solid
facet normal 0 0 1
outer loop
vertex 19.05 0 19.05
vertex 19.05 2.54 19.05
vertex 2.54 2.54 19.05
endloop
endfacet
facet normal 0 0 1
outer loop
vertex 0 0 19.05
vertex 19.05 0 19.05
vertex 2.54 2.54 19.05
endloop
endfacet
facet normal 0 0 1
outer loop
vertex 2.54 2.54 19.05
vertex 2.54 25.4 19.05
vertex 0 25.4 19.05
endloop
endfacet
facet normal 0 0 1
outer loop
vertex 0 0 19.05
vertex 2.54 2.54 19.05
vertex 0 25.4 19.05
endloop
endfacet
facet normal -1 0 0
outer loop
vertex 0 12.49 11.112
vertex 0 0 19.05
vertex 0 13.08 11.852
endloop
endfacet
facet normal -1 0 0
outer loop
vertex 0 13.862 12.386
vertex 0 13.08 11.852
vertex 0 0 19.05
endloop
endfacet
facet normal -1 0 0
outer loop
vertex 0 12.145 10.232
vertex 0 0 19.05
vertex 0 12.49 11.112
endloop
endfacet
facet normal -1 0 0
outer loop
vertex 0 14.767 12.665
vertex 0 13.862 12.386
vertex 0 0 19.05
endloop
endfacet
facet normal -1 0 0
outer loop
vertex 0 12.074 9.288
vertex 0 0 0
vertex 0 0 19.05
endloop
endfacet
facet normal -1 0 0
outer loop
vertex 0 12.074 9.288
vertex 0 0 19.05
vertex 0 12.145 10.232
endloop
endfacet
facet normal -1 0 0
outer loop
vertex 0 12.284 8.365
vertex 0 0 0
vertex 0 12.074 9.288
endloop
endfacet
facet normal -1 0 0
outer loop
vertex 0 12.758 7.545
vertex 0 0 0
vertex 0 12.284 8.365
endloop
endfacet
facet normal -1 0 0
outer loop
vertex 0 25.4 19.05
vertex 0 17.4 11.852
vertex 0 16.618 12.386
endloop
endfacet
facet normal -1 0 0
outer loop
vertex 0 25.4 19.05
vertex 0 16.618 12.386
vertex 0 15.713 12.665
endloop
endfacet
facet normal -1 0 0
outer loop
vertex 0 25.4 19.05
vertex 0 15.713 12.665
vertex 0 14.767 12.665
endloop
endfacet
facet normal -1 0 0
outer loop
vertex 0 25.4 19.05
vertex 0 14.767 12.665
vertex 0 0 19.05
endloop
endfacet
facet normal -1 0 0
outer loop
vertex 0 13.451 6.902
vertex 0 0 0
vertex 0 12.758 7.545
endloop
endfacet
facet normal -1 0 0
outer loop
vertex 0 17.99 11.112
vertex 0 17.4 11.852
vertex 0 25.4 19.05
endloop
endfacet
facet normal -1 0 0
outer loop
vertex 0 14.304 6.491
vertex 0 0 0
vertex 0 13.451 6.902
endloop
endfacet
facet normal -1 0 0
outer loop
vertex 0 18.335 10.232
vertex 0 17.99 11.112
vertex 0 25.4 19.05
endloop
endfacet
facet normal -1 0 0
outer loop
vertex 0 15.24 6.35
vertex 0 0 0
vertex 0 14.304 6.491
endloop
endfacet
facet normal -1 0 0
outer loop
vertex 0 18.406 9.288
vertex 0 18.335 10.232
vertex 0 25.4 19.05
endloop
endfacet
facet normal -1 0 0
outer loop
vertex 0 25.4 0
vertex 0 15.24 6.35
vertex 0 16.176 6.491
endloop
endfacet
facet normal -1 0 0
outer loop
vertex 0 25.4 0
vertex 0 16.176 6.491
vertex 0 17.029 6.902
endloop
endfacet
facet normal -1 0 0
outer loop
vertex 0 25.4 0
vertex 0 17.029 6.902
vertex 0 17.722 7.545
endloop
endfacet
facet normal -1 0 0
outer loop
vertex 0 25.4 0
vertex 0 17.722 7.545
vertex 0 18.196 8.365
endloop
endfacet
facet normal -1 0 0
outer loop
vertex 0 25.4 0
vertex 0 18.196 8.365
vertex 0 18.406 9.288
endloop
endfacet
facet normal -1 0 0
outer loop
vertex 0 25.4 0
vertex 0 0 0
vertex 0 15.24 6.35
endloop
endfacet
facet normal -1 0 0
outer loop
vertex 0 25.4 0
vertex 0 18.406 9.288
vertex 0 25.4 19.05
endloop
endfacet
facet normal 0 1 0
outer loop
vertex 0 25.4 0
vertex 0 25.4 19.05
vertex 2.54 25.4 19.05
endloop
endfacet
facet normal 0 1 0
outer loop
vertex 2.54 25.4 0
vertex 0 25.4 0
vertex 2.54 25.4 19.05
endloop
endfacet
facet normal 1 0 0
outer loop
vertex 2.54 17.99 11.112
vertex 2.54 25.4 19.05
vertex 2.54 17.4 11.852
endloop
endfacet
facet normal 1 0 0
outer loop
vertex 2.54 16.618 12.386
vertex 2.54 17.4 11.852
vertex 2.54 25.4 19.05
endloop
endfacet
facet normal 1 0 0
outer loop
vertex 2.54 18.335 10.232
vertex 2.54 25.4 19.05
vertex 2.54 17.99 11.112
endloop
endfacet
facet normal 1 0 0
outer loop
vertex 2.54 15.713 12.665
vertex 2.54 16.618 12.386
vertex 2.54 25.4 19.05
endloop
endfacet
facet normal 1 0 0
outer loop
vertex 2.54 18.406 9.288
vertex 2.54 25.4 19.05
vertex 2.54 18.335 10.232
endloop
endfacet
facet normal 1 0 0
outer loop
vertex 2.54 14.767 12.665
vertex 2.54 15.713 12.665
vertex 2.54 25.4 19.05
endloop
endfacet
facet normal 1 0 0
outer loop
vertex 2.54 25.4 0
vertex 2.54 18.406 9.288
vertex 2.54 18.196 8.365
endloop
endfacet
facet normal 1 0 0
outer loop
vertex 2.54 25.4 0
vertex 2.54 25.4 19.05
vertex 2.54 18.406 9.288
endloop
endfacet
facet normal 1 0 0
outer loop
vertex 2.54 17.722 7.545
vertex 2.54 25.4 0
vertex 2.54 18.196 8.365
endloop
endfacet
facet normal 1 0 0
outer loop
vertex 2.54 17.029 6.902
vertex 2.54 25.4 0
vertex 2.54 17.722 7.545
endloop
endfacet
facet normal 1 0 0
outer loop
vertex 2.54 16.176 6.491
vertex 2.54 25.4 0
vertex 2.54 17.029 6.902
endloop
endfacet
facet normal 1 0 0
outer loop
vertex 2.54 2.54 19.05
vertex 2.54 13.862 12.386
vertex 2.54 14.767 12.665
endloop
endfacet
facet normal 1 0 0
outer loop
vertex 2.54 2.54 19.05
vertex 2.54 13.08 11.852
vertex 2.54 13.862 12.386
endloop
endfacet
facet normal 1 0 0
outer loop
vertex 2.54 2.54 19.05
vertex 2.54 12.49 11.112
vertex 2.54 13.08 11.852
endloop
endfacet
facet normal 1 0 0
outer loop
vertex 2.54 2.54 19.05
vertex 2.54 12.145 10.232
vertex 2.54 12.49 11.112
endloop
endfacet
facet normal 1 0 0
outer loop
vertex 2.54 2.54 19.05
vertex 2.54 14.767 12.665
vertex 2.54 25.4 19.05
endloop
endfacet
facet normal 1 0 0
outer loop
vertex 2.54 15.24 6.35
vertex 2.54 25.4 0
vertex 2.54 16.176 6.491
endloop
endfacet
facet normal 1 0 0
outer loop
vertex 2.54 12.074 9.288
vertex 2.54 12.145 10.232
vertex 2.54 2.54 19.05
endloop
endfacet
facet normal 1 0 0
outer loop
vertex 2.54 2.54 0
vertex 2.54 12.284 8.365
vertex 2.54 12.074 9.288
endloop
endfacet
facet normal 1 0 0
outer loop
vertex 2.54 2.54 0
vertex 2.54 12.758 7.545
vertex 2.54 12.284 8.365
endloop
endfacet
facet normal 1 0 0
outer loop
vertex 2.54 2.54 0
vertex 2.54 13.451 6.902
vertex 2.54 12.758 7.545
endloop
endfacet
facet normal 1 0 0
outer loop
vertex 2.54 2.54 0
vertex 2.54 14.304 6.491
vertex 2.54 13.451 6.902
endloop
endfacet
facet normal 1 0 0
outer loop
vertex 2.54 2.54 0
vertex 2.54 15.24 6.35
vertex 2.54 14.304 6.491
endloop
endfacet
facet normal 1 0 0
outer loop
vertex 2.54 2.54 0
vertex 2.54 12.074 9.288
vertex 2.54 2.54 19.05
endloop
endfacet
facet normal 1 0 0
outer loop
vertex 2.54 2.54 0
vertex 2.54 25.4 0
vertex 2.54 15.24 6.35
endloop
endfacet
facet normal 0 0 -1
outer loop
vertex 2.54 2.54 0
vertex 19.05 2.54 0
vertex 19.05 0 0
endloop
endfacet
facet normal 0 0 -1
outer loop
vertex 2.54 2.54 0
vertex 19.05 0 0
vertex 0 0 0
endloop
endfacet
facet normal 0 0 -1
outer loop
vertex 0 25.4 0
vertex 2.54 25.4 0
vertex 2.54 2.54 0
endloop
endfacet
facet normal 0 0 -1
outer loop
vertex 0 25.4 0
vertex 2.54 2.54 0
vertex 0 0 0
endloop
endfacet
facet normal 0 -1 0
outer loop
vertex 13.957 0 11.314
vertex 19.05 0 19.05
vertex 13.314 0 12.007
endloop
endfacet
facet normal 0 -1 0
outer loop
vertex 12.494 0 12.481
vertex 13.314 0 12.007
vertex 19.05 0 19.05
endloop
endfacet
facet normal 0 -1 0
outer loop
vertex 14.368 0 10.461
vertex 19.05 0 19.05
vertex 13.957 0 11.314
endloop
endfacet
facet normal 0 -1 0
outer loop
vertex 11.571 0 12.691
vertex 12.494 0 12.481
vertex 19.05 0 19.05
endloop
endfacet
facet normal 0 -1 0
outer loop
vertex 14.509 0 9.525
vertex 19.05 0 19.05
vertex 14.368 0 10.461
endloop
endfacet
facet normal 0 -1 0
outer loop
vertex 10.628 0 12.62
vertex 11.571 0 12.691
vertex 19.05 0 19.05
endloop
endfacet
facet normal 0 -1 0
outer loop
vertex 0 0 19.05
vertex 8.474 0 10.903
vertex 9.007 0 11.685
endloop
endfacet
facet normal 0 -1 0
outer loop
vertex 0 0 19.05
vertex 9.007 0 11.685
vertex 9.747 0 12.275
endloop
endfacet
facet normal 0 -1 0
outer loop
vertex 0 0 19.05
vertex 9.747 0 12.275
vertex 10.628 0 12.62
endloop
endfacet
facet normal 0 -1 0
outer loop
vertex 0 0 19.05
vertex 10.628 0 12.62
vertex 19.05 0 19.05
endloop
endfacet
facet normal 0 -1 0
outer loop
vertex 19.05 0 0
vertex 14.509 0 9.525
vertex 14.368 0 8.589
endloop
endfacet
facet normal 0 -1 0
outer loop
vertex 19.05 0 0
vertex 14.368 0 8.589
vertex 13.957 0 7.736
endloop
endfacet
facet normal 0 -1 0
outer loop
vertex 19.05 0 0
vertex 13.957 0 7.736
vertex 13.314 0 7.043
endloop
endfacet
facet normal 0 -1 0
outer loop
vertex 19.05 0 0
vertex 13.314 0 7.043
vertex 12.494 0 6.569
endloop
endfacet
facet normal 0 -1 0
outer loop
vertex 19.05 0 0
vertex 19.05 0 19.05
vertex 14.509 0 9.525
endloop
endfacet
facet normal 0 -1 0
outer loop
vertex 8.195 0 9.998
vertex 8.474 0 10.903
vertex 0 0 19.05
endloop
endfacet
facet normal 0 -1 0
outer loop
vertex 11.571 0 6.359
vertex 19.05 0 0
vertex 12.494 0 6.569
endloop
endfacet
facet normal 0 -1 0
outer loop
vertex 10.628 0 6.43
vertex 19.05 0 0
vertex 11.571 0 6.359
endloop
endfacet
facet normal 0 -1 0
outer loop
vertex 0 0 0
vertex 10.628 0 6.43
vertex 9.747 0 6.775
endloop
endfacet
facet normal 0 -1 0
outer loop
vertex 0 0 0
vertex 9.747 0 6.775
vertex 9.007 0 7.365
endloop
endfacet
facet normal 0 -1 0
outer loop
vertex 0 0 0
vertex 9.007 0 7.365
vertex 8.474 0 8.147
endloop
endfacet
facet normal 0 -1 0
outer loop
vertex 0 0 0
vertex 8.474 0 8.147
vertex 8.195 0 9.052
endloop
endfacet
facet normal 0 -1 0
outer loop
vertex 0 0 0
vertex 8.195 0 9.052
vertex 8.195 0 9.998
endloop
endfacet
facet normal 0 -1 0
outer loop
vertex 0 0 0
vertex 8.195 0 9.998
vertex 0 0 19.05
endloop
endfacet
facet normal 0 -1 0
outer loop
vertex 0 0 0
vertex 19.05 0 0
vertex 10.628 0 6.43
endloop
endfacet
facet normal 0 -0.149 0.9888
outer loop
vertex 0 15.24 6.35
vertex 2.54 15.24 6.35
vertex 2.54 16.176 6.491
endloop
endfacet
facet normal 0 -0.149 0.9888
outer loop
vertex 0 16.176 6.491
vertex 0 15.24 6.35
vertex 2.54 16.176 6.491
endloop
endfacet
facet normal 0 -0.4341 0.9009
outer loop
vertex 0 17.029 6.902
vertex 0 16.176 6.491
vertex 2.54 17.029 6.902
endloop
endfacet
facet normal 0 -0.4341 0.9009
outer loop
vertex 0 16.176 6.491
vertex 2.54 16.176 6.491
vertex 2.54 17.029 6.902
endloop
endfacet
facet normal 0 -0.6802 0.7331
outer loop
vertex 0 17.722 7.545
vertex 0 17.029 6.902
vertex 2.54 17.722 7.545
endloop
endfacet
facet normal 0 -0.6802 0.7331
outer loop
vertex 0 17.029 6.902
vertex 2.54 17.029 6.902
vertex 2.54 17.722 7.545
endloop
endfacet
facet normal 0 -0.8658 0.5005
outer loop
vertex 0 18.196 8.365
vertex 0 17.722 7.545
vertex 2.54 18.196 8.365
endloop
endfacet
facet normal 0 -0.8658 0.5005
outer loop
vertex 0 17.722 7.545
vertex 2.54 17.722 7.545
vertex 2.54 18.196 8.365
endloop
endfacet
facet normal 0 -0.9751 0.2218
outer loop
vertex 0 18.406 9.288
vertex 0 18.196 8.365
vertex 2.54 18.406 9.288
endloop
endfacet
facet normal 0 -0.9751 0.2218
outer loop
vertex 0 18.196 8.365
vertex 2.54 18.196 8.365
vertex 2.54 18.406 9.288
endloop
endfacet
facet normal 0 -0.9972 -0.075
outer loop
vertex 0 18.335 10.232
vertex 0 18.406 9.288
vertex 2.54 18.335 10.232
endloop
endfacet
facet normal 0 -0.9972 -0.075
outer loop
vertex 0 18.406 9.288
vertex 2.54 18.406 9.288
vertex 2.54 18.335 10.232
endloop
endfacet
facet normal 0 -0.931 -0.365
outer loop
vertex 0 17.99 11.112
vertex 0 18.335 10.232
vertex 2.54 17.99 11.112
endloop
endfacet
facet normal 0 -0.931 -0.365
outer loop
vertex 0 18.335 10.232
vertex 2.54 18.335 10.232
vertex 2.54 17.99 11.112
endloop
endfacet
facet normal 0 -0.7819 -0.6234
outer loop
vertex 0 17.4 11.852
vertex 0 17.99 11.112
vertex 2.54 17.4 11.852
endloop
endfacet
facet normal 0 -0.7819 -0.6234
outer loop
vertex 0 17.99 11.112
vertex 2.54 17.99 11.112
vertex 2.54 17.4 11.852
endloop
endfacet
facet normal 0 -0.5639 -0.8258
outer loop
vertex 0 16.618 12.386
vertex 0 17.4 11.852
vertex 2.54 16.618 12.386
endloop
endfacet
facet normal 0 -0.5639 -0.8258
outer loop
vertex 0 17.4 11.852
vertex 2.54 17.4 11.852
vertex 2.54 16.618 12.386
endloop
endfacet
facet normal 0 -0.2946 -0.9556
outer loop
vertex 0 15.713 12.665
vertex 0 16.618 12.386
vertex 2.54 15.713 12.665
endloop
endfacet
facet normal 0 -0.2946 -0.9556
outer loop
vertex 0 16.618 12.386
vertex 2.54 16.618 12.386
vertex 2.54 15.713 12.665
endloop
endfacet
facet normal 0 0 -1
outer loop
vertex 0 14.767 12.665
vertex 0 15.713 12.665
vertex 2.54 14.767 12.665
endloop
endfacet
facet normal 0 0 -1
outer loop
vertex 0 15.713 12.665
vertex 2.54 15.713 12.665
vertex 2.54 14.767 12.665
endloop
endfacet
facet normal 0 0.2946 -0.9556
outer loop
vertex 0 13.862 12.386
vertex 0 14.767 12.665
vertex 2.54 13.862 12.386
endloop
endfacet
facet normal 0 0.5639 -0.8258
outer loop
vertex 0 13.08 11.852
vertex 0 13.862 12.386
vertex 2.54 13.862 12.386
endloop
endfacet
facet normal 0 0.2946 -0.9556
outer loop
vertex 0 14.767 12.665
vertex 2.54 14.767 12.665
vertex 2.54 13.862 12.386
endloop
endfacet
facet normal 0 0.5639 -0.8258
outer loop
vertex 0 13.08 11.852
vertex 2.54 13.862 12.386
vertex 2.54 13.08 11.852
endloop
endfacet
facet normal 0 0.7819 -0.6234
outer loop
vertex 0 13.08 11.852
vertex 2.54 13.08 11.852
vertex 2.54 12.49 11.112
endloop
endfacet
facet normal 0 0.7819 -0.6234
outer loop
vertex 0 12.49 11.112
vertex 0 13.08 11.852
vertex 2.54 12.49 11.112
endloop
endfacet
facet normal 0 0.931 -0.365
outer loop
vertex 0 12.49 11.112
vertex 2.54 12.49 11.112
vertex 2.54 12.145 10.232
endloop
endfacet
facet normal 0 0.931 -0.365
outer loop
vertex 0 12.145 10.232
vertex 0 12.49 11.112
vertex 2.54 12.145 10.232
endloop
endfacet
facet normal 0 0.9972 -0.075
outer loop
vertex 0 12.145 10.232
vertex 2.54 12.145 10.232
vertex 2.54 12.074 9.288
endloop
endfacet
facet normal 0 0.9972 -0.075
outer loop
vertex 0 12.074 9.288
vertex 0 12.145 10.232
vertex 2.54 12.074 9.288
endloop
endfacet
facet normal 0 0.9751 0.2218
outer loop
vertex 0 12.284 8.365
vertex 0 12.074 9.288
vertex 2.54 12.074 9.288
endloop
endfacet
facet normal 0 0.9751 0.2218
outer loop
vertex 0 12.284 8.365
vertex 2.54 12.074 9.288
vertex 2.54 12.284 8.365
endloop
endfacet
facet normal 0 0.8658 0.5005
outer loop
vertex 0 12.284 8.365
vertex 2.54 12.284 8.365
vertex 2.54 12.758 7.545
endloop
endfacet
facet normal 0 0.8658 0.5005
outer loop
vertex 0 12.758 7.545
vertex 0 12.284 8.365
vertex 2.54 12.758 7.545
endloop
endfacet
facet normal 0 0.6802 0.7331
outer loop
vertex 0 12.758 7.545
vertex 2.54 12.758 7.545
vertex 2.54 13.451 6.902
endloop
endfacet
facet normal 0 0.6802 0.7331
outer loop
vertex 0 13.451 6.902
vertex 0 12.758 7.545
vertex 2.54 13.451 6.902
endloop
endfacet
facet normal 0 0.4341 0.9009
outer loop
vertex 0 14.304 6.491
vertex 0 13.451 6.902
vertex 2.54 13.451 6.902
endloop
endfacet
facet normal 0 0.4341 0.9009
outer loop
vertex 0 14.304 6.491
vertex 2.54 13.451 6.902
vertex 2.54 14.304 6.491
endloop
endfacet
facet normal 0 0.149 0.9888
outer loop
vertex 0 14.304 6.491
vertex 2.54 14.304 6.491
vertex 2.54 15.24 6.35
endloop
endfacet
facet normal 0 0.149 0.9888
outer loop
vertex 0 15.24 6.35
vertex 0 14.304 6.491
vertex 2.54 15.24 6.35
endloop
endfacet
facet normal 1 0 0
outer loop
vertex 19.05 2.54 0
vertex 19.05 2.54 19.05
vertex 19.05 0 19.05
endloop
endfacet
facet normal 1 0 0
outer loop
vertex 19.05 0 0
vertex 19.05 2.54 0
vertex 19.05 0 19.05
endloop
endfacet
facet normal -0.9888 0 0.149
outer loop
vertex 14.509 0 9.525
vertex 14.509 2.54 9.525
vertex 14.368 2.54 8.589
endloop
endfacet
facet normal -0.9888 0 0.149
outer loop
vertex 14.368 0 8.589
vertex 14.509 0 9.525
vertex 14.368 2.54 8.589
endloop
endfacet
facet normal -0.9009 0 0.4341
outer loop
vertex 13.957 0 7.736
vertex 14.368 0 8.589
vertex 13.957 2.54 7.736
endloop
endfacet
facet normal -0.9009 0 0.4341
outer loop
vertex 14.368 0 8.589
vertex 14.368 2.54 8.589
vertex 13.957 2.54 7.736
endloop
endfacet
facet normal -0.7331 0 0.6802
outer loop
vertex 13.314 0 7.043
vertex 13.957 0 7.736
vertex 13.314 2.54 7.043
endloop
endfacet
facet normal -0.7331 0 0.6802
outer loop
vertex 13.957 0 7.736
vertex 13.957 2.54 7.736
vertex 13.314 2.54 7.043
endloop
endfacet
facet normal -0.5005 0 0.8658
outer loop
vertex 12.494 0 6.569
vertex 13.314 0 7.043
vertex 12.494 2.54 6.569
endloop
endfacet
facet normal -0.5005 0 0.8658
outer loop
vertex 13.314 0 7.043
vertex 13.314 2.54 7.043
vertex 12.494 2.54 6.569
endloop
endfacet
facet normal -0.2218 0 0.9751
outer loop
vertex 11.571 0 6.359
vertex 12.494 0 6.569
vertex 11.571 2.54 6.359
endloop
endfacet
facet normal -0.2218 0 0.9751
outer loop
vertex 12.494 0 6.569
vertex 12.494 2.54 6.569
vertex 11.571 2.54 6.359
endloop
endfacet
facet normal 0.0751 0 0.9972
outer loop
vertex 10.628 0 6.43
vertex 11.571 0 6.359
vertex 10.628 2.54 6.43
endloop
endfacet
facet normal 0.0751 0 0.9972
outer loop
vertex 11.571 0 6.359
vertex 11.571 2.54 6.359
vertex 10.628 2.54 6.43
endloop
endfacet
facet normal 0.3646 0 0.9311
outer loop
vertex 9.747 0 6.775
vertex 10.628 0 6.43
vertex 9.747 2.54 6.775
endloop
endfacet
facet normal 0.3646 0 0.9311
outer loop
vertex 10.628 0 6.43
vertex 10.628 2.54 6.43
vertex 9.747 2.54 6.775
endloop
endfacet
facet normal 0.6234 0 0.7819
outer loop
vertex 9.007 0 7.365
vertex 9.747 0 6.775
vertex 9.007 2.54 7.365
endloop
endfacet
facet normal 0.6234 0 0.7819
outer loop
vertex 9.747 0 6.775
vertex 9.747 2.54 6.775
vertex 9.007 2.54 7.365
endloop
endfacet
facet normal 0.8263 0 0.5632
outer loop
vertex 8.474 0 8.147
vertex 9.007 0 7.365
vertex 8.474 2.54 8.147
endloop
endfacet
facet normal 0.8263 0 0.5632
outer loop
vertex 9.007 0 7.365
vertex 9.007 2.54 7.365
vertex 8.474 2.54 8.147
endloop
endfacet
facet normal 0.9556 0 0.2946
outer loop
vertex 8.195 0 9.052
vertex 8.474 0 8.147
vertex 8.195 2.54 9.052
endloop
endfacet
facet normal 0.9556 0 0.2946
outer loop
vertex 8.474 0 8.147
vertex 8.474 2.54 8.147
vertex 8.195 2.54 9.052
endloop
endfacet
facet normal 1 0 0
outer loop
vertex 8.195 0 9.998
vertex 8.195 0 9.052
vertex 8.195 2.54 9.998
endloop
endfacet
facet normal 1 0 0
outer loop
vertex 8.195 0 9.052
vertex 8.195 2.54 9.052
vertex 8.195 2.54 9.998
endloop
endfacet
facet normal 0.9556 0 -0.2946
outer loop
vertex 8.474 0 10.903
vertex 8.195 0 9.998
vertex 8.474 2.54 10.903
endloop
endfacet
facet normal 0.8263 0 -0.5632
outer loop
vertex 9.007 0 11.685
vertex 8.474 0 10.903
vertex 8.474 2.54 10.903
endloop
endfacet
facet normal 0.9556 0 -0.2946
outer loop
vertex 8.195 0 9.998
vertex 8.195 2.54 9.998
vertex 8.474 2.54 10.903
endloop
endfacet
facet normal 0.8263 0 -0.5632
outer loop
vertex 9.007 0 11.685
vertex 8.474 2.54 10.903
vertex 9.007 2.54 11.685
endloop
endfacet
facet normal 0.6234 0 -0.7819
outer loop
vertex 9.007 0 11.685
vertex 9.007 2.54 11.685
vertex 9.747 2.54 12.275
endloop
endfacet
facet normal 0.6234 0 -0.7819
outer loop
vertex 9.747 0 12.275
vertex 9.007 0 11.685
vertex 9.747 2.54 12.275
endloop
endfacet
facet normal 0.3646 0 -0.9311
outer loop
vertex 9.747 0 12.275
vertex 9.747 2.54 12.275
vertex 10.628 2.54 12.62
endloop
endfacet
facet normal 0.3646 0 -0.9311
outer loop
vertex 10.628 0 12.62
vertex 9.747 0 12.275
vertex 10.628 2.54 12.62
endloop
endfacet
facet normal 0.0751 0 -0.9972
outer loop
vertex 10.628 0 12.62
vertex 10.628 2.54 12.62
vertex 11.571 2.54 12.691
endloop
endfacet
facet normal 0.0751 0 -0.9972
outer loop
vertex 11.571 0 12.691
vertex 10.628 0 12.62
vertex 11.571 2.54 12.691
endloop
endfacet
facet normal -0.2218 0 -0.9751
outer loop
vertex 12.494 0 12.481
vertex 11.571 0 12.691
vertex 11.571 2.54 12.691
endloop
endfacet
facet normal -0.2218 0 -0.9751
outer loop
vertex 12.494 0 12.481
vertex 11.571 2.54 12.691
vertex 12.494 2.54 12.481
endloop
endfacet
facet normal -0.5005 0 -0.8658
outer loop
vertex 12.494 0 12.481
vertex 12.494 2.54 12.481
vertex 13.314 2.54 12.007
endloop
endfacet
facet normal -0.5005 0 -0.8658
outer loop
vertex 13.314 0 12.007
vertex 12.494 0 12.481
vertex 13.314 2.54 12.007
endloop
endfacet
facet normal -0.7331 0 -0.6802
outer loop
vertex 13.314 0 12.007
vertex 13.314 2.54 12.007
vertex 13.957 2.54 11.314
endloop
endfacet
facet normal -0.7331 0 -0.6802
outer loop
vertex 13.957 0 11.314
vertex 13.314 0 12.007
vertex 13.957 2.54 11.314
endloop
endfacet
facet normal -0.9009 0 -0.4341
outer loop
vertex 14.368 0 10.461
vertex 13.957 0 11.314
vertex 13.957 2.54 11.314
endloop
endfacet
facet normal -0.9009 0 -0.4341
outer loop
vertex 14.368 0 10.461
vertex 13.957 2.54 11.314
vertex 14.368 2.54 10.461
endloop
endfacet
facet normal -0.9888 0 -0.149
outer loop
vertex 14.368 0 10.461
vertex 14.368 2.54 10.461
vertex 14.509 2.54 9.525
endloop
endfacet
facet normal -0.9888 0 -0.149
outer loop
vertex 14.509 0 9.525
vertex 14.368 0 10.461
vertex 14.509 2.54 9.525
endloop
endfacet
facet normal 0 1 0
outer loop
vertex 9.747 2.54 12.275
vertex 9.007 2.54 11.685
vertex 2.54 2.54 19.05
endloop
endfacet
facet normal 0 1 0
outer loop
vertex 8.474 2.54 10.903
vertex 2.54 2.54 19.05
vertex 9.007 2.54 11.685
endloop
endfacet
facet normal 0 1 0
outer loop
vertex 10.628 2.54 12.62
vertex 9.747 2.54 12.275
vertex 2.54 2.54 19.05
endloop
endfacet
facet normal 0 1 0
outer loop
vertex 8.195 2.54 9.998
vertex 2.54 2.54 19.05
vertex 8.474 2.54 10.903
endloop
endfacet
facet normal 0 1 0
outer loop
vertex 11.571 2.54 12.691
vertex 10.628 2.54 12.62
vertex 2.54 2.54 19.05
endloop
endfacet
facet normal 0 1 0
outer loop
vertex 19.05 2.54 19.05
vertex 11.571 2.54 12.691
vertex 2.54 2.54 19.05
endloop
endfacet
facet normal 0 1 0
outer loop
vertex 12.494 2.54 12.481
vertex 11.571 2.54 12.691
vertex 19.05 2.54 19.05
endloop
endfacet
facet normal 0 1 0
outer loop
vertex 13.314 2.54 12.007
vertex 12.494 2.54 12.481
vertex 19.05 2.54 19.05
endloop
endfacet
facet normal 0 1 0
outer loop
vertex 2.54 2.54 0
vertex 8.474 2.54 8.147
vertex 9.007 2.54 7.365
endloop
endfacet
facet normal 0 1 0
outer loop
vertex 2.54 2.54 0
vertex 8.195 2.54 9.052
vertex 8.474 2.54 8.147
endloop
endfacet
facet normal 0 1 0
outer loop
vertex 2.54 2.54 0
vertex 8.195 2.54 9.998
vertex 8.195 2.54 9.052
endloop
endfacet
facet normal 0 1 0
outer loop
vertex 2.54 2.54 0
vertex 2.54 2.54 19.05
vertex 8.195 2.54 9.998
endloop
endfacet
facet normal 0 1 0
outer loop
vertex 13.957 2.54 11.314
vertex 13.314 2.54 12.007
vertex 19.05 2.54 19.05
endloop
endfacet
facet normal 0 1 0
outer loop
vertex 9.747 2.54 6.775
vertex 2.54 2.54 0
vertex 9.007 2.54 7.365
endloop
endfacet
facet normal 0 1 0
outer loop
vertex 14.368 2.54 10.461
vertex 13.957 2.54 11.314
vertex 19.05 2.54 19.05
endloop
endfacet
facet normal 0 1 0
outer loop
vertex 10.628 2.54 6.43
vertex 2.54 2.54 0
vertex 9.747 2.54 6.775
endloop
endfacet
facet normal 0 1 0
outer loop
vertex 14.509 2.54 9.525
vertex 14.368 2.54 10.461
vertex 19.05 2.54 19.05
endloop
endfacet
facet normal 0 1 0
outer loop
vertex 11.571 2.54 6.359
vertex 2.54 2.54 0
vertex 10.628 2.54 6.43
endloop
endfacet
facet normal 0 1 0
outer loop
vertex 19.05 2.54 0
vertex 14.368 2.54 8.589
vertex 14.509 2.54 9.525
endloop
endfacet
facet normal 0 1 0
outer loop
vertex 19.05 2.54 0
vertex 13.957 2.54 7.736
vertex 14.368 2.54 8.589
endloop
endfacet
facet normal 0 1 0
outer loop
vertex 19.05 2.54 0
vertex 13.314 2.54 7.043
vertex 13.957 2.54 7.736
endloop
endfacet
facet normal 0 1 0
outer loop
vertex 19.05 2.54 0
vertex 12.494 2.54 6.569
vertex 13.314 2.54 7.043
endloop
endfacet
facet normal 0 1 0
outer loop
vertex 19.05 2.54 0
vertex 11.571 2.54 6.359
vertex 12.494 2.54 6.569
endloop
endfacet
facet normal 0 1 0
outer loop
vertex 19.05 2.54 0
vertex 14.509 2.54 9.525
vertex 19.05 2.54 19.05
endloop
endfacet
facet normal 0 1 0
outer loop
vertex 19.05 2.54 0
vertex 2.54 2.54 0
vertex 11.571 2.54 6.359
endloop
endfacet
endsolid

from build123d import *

# Parameters (mm, degrees)
BOSS_EXTRUDE2_DEPTH = 19.05
SKETCH3_R           = 3.175
CUT_EXTRUDE1_DEPTH  = 19.05
SKETCH4_R           = 3.175
CUT_EXTRUDE2_DEPTH  = 19.05


with BuildPart() as part:
    # Sketch2 → Boss-Extrude2 (new body)
    with BuildSketch(Plane.XY):
        Polygon((0, 0), (0, 25.4), (2.54, 25.4), (2.54, 2.54), (19.05, 2.54), (19.05, 0), align=None)
    extrude(amount=BOSS_EXTRUDE2_DEPTH)

    # Sketch3 → Cut-Extrude1 (cut)
    with BuildSketch(Plane(origin=(2.54, 0, 0), x_dir=(0, 0, -1), z_dir=(1, 0, 0))):
        with Locations((-9.525, 15.24)):
            Circle(SKETCH3_R)
    extrude(amount=-CUT_EXTRUDE1_DEPTH, mode=Mode.SUBTRACT)

    # Sketch4 → Cut-Extrude2 (cut)
    with BuildSketch(Plane(origin=(0, 2.54, 0), x_dir=(1, 0, 0), z_dir=(0, 1, 0))):
        with Locations((11.334166685, -9.525)):
            Circle(SKETCH4_R)
    extrude(amount=-CUT_EXTRUDE2_DEPTH, mode=Mode.SUBTRACT)


solid = part.part
